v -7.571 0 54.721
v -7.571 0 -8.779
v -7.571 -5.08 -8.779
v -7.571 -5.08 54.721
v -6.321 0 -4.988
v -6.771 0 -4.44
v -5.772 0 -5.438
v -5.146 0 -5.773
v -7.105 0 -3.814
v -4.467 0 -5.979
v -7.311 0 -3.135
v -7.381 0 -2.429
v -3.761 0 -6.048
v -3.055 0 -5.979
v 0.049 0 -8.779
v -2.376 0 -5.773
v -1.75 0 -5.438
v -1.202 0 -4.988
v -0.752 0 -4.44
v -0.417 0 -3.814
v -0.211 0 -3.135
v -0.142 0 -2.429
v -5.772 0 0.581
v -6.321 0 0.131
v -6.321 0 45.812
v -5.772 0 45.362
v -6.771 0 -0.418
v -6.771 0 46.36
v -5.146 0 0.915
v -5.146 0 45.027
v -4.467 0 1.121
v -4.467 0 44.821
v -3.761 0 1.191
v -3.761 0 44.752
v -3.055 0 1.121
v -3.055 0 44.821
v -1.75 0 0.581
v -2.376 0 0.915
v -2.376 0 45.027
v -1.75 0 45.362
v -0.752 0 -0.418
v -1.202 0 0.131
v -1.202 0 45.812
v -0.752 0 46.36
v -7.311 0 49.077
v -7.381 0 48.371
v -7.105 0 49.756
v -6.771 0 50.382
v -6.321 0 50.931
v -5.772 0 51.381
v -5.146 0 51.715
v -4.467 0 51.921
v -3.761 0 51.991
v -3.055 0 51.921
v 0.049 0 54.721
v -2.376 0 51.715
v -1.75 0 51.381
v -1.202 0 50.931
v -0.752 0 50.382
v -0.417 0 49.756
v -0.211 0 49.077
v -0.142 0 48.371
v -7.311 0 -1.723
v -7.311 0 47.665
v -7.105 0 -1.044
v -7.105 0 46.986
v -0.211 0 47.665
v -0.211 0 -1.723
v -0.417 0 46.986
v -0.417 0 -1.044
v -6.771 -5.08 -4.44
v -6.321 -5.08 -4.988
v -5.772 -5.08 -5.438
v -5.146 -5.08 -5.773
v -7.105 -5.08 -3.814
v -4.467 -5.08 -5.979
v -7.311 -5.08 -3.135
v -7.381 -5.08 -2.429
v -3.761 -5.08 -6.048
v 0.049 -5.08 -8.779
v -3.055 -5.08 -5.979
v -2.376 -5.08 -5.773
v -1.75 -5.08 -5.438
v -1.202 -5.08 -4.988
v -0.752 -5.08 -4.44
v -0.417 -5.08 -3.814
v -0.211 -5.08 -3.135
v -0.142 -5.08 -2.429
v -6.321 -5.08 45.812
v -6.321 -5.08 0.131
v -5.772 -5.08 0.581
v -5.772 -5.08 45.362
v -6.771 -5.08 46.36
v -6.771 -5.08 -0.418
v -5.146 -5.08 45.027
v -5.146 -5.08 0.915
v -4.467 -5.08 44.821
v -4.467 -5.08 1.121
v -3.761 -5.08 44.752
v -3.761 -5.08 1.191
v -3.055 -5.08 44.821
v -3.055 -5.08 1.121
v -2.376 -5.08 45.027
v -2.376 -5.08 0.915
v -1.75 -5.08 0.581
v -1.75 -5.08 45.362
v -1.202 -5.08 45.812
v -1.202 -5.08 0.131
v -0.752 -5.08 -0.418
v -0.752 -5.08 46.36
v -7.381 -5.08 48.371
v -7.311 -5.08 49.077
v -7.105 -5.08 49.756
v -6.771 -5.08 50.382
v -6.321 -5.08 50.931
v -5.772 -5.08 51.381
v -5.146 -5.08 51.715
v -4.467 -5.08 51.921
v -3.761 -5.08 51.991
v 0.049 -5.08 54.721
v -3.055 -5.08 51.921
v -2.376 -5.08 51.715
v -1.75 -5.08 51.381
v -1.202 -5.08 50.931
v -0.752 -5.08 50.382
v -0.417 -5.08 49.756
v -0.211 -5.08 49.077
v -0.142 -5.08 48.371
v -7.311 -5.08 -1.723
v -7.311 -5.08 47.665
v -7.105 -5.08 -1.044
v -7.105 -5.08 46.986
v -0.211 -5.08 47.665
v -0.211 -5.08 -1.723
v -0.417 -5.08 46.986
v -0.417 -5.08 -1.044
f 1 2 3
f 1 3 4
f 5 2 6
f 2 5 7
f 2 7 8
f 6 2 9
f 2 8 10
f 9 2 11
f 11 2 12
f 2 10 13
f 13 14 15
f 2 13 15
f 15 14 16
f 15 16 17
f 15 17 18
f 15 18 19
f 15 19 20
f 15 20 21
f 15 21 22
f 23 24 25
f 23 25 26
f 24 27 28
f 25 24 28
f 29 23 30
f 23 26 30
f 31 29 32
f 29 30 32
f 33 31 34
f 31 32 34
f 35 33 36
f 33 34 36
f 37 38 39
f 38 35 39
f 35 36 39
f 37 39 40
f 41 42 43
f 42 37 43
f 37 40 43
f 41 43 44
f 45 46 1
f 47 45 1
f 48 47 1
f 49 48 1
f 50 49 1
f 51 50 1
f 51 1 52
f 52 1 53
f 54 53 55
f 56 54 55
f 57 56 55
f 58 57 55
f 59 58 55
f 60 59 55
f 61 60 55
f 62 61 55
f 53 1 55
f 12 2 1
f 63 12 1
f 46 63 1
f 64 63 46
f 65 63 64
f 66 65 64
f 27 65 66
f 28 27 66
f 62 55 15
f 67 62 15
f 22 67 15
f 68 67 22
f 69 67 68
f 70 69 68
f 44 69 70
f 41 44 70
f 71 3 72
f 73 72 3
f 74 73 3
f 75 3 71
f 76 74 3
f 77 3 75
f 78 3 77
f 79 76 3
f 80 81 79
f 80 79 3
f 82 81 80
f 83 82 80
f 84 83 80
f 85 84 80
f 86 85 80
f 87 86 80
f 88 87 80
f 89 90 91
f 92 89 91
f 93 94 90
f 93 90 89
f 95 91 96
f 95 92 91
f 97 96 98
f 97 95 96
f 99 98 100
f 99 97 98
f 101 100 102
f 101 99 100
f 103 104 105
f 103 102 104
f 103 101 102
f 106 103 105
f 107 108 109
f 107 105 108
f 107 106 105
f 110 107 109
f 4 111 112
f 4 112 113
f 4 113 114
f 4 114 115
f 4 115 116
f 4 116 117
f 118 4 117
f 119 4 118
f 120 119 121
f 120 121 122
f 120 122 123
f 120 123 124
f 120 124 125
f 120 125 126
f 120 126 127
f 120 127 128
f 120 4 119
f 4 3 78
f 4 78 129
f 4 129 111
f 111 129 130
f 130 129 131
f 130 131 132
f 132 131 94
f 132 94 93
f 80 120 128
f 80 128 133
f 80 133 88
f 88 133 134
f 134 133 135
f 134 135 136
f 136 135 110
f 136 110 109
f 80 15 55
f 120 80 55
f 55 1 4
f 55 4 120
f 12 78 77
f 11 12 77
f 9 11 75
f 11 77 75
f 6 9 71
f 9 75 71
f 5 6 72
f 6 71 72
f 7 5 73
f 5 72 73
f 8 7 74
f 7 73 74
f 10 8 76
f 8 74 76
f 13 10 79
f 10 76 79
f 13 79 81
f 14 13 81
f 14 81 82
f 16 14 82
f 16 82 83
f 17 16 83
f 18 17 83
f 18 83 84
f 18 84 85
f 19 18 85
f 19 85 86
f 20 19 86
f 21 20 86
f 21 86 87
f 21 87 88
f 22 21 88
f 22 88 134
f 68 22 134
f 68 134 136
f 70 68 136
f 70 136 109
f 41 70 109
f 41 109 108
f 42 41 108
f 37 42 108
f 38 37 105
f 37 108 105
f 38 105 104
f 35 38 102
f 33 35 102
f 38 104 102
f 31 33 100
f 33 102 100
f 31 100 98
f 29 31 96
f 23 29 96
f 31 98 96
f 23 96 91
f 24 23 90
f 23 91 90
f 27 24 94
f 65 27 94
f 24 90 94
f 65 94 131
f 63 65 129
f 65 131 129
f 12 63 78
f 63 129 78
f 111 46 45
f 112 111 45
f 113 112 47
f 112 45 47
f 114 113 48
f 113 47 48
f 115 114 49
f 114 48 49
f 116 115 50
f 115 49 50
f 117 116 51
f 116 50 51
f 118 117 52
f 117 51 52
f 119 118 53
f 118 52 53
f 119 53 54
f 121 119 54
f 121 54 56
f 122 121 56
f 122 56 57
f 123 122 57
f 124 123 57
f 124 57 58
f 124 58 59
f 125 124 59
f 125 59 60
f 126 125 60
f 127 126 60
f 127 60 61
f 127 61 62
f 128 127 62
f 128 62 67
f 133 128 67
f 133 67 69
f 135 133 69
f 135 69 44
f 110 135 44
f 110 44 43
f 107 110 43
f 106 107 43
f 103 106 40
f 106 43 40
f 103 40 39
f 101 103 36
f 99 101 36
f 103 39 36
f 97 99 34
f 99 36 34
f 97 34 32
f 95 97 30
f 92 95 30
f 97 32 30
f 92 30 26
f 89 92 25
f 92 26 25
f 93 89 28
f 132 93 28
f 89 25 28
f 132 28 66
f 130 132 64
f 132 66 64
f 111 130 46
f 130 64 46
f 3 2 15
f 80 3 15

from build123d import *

# Parameters (mm, degrees)
F0_W     = 7.62
F0_H     = 63.5
F1_DEPTH = 5.08
F4_D     = 7.239
F5_D     = 7.239


with BuildPart() as f1:
    # F0 (on Front) → F1 (new body)
    with BuildSketch(Plane.XZ):
        with Locations((-3.7611387034, 22.9711361981)):
            Rectangle(F0_W, F0_H)
    extrude(amount=F1_DEPTH)

    # F4 (through all)
    with Locations(Plane.XZ.offset(5.08)):
        with Locations((-3.7611387034, 48.3711361981)):
            Hole(F4_D / 2)

    # F5 (through all)
    with Locations(Plane(origin=(0, 0, 0), x_dir=(1, 0, 0), z_dir=(0, 1, 0))):
        with Locations((-3.7611387034, 2.4288638019)):
            Hole(F5_D / 2)


solid = f1.part
